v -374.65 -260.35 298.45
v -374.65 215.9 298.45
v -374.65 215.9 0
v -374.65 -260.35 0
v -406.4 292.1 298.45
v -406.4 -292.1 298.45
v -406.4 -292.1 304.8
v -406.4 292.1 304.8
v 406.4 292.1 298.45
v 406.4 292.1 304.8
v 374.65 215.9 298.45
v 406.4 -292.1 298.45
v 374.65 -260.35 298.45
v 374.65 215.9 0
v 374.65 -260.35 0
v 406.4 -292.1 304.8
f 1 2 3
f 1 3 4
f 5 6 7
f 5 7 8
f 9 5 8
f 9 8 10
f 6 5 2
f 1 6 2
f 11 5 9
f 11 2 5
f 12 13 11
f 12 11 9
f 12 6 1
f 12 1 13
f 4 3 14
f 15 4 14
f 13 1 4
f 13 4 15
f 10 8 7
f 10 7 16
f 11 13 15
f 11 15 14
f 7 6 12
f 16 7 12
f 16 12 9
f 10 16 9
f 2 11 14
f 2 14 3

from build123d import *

# Parameters (mm, degrees)
F0_W     = 812.8
F0_H     = 584.2
F1_DEPTH = 304.8
F2_W     = 812.8
F2_H     = 298.45
F3_DEPTH = 31.75
F4_W     = 812.8
F4_H     = 298.45
F5_DEPTH = 76.2
F6_W     = 476.25
F6_H     = 298.45
F7_DEPTH = 31.75
F8_W     = 476.25
F8_H     = 298.45
F9_DEPTH = 31.75


with BuildPart() as f1:
    # F0 (on Top) → F1 (new body)
    with BuildSketch(Plane.XY):
        Rectangle(F0_W, F0_H)
    extrude(amount=F1_DEPTH)

    # F2 (on face) → F3 (cut)
    with BuildSketch(Plane.XZ.offset(292.1)):
        with Locations((0, 149.225)):
            Rectangle(F2_W, F2_H)
    extrude(amount=-F3_DEPTH, mode=Mode.SUBTRACT)

    # F4 (on face) → F5 (cut)
    with BuildSketch(Plane(origin=(0, 292.1, 0), x_dir=(-1, 0, 0), z_dir=(0, 1, 0))):
        with Locations((0, 149.225)):
            Rectangle(F4_W, F4_H)
    extrude(amount=-F5_DEPTH, mode=Mode.SUBTRACT)

    # F6 (on face) → F7 (cut)
    with BuildSketch(Plane.YZ.offset(406.4)):
        with Locations((-22.225, 149.225)):
            Rectangle(F6_W, F6_H)
    extrude(amount=-F7_DEPTH, mode=Mode.SUBTRACT)

    # F8 (on face) → F9 (cut)
    with BuildSketch(Plane(origin=(-406.4, 0, 0), x_dir=(0, -1, 0), z_dir=(-1, 0, 0))):
        with Locations((22.225, 149.225)):
            Rectangle(F8_W, F8_H)
    extrude(amount=-F9_DEPTH, mode=Mode.SUBTRACT)


solid = f1.part
